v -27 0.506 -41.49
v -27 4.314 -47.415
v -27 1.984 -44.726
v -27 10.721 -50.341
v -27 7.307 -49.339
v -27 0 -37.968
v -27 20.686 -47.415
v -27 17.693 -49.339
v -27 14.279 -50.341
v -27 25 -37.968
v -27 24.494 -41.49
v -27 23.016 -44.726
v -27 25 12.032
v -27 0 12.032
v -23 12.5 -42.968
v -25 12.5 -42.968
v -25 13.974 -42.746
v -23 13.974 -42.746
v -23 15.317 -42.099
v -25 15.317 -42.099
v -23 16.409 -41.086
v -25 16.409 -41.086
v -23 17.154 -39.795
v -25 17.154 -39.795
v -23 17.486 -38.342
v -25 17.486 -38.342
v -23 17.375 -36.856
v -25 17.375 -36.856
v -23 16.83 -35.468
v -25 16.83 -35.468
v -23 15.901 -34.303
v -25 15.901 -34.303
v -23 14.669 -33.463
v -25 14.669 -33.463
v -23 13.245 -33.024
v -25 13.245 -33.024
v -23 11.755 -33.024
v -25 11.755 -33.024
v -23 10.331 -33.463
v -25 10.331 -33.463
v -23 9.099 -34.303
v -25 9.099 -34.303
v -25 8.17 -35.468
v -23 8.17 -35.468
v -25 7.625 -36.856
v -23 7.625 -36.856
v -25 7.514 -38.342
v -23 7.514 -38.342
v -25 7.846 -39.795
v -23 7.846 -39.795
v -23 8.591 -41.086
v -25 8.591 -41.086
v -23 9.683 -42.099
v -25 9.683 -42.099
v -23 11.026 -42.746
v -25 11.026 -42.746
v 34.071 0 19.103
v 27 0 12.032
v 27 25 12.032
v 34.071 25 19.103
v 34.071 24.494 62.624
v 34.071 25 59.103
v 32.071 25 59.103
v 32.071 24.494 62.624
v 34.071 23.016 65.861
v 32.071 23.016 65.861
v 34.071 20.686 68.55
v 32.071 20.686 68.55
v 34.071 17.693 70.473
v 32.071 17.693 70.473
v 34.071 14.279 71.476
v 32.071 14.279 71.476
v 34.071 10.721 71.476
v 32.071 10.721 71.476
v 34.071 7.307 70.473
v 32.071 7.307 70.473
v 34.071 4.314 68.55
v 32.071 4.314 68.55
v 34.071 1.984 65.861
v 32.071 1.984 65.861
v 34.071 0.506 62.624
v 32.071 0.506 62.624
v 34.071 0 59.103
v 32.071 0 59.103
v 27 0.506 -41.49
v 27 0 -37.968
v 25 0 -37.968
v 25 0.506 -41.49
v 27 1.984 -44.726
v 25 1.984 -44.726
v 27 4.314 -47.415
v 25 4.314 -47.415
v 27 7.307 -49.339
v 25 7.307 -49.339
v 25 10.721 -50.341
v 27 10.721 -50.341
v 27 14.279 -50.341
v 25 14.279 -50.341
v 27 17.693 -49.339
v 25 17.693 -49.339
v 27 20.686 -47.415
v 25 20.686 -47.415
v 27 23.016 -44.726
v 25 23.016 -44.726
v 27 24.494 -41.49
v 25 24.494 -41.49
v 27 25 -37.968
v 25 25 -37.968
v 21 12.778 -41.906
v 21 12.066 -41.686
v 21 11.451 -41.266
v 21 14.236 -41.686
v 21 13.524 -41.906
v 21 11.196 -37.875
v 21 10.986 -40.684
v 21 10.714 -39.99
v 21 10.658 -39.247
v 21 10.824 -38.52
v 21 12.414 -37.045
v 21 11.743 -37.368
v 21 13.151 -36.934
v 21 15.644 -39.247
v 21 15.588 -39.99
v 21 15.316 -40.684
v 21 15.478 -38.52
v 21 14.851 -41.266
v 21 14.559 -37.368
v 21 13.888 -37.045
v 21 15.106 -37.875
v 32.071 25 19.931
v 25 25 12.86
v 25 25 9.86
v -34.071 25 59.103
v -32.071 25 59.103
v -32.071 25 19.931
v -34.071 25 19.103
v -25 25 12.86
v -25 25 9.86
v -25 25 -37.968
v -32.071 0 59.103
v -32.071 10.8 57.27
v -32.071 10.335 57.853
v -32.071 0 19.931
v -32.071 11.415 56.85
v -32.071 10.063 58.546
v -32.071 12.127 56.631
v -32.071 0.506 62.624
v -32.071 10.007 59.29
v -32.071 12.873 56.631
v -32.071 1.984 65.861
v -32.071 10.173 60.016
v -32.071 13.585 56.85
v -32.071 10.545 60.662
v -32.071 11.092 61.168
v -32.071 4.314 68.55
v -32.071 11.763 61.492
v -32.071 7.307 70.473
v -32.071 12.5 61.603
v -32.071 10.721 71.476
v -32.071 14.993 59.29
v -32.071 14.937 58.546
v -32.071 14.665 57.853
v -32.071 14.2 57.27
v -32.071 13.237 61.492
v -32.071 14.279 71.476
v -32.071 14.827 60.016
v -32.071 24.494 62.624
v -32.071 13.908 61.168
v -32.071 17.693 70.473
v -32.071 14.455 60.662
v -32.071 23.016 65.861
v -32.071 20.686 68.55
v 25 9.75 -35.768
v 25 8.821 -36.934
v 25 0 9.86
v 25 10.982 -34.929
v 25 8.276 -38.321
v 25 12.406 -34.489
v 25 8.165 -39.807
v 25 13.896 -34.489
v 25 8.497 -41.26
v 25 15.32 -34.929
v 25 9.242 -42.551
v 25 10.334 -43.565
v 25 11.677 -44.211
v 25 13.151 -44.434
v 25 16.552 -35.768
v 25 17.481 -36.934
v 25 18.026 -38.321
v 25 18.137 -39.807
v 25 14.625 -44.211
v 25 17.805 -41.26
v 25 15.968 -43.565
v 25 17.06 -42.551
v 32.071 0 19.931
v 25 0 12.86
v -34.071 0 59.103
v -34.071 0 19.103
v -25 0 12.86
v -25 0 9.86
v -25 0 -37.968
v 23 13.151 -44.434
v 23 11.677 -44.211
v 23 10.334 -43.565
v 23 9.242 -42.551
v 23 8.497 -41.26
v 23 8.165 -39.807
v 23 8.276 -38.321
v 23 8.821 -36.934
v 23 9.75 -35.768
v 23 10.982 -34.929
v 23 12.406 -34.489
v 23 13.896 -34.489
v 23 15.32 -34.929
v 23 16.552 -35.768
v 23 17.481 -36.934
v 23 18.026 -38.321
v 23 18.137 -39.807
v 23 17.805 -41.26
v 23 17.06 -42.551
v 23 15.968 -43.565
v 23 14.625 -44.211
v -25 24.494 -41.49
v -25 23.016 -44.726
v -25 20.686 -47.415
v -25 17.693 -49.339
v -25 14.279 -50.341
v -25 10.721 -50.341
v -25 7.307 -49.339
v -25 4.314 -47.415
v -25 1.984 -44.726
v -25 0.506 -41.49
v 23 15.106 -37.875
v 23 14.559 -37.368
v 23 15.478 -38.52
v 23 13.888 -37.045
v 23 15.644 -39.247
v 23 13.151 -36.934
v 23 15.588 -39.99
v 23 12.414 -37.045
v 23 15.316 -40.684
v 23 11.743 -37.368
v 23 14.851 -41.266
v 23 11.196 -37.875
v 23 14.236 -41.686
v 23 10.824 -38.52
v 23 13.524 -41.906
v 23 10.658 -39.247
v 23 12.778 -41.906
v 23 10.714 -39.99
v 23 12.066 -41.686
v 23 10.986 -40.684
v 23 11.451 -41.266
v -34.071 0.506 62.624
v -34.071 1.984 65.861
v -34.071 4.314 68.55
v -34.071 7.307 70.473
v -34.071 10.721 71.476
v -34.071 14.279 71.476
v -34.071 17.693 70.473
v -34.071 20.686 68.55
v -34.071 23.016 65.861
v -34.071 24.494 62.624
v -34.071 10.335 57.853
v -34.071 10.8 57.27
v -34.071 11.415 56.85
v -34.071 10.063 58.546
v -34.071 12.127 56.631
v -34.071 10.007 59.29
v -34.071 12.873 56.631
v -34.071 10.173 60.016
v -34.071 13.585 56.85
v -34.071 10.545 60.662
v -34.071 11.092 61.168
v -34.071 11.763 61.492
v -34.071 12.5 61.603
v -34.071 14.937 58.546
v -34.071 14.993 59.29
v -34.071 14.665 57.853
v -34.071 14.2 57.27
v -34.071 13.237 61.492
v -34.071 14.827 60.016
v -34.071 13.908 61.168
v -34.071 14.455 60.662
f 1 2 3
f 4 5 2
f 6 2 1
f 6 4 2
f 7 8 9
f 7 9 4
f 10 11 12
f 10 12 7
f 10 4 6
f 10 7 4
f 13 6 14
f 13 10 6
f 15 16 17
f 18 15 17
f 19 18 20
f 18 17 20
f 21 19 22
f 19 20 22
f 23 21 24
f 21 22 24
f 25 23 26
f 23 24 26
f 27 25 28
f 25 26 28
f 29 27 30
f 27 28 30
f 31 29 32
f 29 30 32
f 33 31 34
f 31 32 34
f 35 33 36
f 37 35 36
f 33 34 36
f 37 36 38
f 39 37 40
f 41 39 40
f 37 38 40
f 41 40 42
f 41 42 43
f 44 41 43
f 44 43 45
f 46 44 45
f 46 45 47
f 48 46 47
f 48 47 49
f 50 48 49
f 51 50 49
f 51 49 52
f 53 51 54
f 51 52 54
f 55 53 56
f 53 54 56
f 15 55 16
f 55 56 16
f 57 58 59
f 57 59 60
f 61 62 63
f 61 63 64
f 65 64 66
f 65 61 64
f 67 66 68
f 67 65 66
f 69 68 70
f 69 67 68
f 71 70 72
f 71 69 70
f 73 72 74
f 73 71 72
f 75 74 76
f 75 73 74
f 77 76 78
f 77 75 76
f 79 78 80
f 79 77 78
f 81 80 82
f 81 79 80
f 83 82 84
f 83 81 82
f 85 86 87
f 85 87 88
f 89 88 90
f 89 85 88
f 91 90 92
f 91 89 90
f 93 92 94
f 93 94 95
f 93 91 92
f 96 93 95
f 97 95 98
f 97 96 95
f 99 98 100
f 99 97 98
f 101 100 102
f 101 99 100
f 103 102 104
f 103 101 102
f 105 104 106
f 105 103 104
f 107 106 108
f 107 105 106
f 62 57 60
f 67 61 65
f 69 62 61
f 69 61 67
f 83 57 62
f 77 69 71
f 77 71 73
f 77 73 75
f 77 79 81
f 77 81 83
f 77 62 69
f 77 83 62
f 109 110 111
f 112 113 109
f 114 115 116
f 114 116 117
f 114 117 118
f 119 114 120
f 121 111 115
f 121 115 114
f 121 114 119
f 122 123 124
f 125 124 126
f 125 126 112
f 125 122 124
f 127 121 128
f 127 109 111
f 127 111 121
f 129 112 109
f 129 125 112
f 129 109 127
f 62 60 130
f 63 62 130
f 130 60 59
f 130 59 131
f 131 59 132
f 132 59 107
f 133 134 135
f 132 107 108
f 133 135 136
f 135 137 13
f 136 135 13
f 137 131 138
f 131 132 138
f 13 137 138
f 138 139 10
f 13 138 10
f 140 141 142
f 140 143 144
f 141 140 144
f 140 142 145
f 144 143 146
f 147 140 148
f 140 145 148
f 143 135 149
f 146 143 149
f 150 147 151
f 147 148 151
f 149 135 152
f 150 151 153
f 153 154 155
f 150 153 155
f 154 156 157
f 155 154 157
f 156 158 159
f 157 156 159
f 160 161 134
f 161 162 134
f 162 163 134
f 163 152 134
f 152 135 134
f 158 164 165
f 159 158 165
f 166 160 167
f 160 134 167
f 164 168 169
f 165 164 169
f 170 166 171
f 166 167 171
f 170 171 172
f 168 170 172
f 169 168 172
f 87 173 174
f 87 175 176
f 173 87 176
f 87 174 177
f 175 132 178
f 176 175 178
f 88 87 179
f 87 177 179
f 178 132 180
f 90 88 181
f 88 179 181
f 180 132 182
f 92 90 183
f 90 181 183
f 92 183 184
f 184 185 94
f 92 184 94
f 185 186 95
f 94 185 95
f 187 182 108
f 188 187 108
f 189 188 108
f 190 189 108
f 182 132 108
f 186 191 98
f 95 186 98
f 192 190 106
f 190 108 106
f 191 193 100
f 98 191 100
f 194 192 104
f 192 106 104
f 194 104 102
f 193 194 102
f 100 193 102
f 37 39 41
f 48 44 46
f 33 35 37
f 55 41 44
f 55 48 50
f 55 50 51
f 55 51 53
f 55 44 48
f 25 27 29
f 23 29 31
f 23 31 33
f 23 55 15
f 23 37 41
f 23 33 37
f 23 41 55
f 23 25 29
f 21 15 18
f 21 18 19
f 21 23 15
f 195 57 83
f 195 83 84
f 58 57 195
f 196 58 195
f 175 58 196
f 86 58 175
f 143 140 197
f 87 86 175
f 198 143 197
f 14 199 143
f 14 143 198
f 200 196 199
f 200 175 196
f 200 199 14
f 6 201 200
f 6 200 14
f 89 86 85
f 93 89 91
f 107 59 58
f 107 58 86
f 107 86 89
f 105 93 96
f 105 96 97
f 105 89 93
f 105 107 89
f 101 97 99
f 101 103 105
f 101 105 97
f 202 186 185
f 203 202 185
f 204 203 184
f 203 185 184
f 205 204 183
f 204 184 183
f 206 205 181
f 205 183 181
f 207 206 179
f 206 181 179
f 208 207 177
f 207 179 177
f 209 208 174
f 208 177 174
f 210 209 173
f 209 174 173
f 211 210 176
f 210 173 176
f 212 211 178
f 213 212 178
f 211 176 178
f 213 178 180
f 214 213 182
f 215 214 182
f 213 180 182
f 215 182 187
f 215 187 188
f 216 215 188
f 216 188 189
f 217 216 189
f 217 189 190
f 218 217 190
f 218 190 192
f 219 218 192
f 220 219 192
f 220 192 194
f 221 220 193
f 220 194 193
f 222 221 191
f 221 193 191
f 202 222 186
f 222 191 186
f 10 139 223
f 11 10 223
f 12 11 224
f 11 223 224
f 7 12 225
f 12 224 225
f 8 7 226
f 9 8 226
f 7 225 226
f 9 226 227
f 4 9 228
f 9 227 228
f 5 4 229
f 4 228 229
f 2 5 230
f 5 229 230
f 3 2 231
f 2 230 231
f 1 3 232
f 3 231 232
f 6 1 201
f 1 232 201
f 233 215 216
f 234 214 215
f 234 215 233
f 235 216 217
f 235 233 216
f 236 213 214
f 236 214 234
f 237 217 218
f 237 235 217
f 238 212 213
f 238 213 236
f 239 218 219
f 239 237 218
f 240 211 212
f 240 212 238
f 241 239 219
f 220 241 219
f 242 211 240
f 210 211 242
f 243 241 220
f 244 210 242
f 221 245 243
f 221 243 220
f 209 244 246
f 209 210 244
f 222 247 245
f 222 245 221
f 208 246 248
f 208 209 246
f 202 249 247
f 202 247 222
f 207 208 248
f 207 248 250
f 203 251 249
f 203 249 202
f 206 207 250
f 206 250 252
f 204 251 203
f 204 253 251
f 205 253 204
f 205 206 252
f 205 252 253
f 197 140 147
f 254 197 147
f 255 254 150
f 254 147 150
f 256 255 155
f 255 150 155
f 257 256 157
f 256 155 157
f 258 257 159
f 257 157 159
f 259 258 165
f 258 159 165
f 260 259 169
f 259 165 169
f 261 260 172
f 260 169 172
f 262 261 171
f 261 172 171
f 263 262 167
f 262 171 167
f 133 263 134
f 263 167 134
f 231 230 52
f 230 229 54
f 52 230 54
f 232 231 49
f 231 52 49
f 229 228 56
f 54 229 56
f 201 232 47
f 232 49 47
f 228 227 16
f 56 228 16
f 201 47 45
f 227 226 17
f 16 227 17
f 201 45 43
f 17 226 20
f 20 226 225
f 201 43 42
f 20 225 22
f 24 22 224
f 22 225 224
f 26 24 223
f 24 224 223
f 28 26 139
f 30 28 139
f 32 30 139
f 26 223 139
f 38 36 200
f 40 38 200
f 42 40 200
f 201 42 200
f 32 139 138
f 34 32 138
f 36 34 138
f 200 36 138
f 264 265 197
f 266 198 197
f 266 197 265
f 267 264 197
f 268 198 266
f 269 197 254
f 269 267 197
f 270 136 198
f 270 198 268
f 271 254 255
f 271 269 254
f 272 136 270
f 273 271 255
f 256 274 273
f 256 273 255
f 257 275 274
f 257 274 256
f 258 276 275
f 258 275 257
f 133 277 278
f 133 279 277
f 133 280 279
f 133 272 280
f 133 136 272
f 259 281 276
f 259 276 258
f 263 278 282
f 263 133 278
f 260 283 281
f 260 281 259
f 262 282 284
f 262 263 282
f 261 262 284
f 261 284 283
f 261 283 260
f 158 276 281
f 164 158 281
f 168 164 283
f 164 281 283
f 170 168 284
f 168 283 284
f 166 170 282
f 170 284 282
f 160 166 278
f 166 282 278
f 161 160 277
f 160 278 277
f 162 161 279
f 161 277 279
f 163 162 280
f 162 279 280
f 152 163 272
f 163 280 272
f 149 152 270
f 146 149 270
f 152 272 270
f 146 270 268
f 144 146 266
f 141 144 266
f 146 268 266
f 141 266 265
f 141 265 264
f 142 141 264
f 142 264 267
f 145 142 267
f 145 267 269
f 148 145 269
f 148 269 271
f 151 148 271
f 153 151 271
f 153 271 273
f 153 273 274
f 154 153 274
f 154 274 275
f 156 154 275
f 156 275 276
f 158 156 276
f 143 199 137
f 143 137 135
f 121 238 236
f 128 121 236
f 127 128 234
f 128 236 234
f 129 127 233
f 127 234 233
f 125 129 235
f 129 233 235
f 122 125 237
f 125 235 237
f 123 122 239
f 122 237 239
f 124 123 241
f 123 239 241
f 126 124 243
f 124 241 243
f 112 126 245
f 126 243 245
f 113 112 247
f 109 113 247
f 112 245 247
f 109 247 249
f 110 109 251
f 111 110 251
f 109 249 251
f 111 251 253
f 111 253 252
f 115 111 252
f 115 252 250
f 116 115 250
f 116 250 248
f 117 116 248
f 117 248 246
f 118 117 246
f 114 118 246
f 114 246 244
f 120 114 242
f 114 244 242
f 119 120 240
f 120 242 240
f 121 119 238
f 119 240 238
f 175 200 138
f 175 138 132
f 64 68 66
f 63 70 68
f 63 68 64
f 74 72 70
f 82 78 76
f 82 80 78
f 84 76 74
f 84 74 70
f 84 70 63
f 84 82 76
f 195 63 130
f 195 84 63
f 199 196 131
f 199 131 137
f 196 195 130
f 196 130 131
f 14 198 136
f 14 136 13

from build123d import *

# Parameters (mm, degrees)
BOSS_EXTRU_1_DEPTH      = 25
BOSS_EXTRU_2_DEPTH      = 2
BOSS_EXTRU_3_DEPTH      = 2
BOSS_EXTRU_4_START      = -2
BOSS_EXTRU_4_DEPTH      = 2
BOSS_EXTRU_5_START      = -2
BOSS_EXTRU_5_DEPTH      = 2
ESQUISSE6_R             = 2.5
ENL_V_MAT_EXTRU_1_DEPTH = 10
ESQUISSE7_R             = 5
BOSS_EXTRU_6_DEPTH      = 2
ESQUISSE9_R             = 5
BOSS_EXTRU_8_DEPTH      = 2
ESQUISSE10_R            = 2.5
BOSS_EXTRU_9_DEPTH      = 2


with BuildPart() as part:
    # Esquisse1 → Boss.-Extru.1 (new body)
    with BuildSketch(Plane(origin=(0, 0, 0), x_dir=(1, 0, 0), z_dir=(0, 1, 0))):
        Polygon((-34.071067812, -59.102794325), (-34.071067812, -19.102794325), (-27, -12.031726513), (-27, 37.968273487), (-25, 37.968273487), (-25, -9.860153638), (25, -9.860153638), (25, 37.968273487), (27, 37.968273487), (27, -12.031726513), (34.071067812, -19.102794325), (34.071067812, -59.102794325), (32.071067812, -59.102794325), (32.071067812, -19.93122145), (25, -12.860153638), (-25, -12.860153638), (-32.071067812, -19.93122145), (-32.071067812, -59.102794325), align=None)
    extrude(amount=BOSS_EXTRU_1_DEPTH)

    # Esquisse2 → Boss.-Extru.2 (add)
    with BuildSketch(Plane(origin=(34.071067812, 0, 0), x_dir=(0, 0, -1), z_dir=(1, 0, 0))):
        with BuildLine():
            Line((-59.102794325, 0), (-19.102794325, 0))
            Line((-19.102794325, 0), (-19.102794325, 25))
            Line((-19.102794325, 25), (-59.102794325, 25))
            ThreePointArc((-59.102794325, 25), (-71.602794325, 12.5), (-59.102794325, 0))
        make_face()
    extrude(amount=-BOSS_EXTRU_2_DEPTH)

    # Esquisse3 → Boss.-Extru.3 (add)
    with BuildSketch(Plane(origin=(27, 0, 0), x_dir=(0, 0, -1), z_dir=(1, 0, 0))):
        with BuildLine():
            Line((37.968273487, 25), (37.968273487, 0))
            ThreePointArc((37.968273487, 0), (50.468273487, 12.5), (37.968273487, 25))
        make_face()
    extrude(amount=-BOSS_EXTRU_3_DEPTH)

    # Esquisse4 → Boss.-Extru.4 (add)
    with BuildSketch(Plane.ZY.offset(34.071067812).offset(BOSS_EXTRU_4_START)):
        with BuildLine():
            Line((59.102794325, 25), (59.102794325, 0))
            ThreePointArc((59.102794325, 0), (71.602794325, 12.5), (59.102794325, 25))
        make_face()
    extrude(amount=BOSS_EXTRU_4_DEPTH)

    # Esquisse5 → Boss.-Extru.5 (add)
    with BuildSketch(Plane.ZY.offset(27).offset(BOSS_EXTRU_5_START)):
        with BuildLine():
            Line((-37.968273487, 0), (-37.968273487, 25))
            ThreePointArc((-37.968273487, 25), (-50.468273487, 12.5), (-37.968273487, 0))
        make_face()
    extrude(amount=BOSS_EXTRU_5_DEPTH)

    # Esquisse6 → Enlèv. mat.-Extru.1 (cut)
    with BuildSketch(Plane.ZY.offset(34.071067812)):
        with Locations((59.102794325, 12.5)):
            Circle(ESQUISSE6_R)
    extrude(amount=-ENL_V_MAT_EXTRU_1_DEPTH, mode=Mode.SUBTRACT)

    # Esquisse7 → Boss.-Extru.6 (add)
    with BuildSketch(Plane(origin=(-25, 0, 0), x_dir=(0, 0, -1), z_dir=(1, 0, 0))):
        with Locations((37.968273487, 12.5)):
            Circle(ESQUISSE7_R)
    extrude(amount=BOSS_EXTRU_6_DEPTH)

    # Esquisse9 → Boss.-Extru.8 (add)
    with BuildSketch(Plane.ZY.offset(-25)):
        with Locations(Location((-39.433505518, 13.150947635, 0), (0, 0, 180))):
            Circle(ESQUISSE9_R)
    extrude(amount=BOSS_EXTRU_8_DEPTH)

    # Esquisse10 → Boss.-Extru.9 (add)
    with BuildSketch(Plane.ZY.offset(-23)):
        with Locations((-39.433505518, 13.150947635)):
            Circle(ESQUISSE10_R)
    extrude(amount=BOSS_EXTRU_9_DEPTH)


solid = part.part
